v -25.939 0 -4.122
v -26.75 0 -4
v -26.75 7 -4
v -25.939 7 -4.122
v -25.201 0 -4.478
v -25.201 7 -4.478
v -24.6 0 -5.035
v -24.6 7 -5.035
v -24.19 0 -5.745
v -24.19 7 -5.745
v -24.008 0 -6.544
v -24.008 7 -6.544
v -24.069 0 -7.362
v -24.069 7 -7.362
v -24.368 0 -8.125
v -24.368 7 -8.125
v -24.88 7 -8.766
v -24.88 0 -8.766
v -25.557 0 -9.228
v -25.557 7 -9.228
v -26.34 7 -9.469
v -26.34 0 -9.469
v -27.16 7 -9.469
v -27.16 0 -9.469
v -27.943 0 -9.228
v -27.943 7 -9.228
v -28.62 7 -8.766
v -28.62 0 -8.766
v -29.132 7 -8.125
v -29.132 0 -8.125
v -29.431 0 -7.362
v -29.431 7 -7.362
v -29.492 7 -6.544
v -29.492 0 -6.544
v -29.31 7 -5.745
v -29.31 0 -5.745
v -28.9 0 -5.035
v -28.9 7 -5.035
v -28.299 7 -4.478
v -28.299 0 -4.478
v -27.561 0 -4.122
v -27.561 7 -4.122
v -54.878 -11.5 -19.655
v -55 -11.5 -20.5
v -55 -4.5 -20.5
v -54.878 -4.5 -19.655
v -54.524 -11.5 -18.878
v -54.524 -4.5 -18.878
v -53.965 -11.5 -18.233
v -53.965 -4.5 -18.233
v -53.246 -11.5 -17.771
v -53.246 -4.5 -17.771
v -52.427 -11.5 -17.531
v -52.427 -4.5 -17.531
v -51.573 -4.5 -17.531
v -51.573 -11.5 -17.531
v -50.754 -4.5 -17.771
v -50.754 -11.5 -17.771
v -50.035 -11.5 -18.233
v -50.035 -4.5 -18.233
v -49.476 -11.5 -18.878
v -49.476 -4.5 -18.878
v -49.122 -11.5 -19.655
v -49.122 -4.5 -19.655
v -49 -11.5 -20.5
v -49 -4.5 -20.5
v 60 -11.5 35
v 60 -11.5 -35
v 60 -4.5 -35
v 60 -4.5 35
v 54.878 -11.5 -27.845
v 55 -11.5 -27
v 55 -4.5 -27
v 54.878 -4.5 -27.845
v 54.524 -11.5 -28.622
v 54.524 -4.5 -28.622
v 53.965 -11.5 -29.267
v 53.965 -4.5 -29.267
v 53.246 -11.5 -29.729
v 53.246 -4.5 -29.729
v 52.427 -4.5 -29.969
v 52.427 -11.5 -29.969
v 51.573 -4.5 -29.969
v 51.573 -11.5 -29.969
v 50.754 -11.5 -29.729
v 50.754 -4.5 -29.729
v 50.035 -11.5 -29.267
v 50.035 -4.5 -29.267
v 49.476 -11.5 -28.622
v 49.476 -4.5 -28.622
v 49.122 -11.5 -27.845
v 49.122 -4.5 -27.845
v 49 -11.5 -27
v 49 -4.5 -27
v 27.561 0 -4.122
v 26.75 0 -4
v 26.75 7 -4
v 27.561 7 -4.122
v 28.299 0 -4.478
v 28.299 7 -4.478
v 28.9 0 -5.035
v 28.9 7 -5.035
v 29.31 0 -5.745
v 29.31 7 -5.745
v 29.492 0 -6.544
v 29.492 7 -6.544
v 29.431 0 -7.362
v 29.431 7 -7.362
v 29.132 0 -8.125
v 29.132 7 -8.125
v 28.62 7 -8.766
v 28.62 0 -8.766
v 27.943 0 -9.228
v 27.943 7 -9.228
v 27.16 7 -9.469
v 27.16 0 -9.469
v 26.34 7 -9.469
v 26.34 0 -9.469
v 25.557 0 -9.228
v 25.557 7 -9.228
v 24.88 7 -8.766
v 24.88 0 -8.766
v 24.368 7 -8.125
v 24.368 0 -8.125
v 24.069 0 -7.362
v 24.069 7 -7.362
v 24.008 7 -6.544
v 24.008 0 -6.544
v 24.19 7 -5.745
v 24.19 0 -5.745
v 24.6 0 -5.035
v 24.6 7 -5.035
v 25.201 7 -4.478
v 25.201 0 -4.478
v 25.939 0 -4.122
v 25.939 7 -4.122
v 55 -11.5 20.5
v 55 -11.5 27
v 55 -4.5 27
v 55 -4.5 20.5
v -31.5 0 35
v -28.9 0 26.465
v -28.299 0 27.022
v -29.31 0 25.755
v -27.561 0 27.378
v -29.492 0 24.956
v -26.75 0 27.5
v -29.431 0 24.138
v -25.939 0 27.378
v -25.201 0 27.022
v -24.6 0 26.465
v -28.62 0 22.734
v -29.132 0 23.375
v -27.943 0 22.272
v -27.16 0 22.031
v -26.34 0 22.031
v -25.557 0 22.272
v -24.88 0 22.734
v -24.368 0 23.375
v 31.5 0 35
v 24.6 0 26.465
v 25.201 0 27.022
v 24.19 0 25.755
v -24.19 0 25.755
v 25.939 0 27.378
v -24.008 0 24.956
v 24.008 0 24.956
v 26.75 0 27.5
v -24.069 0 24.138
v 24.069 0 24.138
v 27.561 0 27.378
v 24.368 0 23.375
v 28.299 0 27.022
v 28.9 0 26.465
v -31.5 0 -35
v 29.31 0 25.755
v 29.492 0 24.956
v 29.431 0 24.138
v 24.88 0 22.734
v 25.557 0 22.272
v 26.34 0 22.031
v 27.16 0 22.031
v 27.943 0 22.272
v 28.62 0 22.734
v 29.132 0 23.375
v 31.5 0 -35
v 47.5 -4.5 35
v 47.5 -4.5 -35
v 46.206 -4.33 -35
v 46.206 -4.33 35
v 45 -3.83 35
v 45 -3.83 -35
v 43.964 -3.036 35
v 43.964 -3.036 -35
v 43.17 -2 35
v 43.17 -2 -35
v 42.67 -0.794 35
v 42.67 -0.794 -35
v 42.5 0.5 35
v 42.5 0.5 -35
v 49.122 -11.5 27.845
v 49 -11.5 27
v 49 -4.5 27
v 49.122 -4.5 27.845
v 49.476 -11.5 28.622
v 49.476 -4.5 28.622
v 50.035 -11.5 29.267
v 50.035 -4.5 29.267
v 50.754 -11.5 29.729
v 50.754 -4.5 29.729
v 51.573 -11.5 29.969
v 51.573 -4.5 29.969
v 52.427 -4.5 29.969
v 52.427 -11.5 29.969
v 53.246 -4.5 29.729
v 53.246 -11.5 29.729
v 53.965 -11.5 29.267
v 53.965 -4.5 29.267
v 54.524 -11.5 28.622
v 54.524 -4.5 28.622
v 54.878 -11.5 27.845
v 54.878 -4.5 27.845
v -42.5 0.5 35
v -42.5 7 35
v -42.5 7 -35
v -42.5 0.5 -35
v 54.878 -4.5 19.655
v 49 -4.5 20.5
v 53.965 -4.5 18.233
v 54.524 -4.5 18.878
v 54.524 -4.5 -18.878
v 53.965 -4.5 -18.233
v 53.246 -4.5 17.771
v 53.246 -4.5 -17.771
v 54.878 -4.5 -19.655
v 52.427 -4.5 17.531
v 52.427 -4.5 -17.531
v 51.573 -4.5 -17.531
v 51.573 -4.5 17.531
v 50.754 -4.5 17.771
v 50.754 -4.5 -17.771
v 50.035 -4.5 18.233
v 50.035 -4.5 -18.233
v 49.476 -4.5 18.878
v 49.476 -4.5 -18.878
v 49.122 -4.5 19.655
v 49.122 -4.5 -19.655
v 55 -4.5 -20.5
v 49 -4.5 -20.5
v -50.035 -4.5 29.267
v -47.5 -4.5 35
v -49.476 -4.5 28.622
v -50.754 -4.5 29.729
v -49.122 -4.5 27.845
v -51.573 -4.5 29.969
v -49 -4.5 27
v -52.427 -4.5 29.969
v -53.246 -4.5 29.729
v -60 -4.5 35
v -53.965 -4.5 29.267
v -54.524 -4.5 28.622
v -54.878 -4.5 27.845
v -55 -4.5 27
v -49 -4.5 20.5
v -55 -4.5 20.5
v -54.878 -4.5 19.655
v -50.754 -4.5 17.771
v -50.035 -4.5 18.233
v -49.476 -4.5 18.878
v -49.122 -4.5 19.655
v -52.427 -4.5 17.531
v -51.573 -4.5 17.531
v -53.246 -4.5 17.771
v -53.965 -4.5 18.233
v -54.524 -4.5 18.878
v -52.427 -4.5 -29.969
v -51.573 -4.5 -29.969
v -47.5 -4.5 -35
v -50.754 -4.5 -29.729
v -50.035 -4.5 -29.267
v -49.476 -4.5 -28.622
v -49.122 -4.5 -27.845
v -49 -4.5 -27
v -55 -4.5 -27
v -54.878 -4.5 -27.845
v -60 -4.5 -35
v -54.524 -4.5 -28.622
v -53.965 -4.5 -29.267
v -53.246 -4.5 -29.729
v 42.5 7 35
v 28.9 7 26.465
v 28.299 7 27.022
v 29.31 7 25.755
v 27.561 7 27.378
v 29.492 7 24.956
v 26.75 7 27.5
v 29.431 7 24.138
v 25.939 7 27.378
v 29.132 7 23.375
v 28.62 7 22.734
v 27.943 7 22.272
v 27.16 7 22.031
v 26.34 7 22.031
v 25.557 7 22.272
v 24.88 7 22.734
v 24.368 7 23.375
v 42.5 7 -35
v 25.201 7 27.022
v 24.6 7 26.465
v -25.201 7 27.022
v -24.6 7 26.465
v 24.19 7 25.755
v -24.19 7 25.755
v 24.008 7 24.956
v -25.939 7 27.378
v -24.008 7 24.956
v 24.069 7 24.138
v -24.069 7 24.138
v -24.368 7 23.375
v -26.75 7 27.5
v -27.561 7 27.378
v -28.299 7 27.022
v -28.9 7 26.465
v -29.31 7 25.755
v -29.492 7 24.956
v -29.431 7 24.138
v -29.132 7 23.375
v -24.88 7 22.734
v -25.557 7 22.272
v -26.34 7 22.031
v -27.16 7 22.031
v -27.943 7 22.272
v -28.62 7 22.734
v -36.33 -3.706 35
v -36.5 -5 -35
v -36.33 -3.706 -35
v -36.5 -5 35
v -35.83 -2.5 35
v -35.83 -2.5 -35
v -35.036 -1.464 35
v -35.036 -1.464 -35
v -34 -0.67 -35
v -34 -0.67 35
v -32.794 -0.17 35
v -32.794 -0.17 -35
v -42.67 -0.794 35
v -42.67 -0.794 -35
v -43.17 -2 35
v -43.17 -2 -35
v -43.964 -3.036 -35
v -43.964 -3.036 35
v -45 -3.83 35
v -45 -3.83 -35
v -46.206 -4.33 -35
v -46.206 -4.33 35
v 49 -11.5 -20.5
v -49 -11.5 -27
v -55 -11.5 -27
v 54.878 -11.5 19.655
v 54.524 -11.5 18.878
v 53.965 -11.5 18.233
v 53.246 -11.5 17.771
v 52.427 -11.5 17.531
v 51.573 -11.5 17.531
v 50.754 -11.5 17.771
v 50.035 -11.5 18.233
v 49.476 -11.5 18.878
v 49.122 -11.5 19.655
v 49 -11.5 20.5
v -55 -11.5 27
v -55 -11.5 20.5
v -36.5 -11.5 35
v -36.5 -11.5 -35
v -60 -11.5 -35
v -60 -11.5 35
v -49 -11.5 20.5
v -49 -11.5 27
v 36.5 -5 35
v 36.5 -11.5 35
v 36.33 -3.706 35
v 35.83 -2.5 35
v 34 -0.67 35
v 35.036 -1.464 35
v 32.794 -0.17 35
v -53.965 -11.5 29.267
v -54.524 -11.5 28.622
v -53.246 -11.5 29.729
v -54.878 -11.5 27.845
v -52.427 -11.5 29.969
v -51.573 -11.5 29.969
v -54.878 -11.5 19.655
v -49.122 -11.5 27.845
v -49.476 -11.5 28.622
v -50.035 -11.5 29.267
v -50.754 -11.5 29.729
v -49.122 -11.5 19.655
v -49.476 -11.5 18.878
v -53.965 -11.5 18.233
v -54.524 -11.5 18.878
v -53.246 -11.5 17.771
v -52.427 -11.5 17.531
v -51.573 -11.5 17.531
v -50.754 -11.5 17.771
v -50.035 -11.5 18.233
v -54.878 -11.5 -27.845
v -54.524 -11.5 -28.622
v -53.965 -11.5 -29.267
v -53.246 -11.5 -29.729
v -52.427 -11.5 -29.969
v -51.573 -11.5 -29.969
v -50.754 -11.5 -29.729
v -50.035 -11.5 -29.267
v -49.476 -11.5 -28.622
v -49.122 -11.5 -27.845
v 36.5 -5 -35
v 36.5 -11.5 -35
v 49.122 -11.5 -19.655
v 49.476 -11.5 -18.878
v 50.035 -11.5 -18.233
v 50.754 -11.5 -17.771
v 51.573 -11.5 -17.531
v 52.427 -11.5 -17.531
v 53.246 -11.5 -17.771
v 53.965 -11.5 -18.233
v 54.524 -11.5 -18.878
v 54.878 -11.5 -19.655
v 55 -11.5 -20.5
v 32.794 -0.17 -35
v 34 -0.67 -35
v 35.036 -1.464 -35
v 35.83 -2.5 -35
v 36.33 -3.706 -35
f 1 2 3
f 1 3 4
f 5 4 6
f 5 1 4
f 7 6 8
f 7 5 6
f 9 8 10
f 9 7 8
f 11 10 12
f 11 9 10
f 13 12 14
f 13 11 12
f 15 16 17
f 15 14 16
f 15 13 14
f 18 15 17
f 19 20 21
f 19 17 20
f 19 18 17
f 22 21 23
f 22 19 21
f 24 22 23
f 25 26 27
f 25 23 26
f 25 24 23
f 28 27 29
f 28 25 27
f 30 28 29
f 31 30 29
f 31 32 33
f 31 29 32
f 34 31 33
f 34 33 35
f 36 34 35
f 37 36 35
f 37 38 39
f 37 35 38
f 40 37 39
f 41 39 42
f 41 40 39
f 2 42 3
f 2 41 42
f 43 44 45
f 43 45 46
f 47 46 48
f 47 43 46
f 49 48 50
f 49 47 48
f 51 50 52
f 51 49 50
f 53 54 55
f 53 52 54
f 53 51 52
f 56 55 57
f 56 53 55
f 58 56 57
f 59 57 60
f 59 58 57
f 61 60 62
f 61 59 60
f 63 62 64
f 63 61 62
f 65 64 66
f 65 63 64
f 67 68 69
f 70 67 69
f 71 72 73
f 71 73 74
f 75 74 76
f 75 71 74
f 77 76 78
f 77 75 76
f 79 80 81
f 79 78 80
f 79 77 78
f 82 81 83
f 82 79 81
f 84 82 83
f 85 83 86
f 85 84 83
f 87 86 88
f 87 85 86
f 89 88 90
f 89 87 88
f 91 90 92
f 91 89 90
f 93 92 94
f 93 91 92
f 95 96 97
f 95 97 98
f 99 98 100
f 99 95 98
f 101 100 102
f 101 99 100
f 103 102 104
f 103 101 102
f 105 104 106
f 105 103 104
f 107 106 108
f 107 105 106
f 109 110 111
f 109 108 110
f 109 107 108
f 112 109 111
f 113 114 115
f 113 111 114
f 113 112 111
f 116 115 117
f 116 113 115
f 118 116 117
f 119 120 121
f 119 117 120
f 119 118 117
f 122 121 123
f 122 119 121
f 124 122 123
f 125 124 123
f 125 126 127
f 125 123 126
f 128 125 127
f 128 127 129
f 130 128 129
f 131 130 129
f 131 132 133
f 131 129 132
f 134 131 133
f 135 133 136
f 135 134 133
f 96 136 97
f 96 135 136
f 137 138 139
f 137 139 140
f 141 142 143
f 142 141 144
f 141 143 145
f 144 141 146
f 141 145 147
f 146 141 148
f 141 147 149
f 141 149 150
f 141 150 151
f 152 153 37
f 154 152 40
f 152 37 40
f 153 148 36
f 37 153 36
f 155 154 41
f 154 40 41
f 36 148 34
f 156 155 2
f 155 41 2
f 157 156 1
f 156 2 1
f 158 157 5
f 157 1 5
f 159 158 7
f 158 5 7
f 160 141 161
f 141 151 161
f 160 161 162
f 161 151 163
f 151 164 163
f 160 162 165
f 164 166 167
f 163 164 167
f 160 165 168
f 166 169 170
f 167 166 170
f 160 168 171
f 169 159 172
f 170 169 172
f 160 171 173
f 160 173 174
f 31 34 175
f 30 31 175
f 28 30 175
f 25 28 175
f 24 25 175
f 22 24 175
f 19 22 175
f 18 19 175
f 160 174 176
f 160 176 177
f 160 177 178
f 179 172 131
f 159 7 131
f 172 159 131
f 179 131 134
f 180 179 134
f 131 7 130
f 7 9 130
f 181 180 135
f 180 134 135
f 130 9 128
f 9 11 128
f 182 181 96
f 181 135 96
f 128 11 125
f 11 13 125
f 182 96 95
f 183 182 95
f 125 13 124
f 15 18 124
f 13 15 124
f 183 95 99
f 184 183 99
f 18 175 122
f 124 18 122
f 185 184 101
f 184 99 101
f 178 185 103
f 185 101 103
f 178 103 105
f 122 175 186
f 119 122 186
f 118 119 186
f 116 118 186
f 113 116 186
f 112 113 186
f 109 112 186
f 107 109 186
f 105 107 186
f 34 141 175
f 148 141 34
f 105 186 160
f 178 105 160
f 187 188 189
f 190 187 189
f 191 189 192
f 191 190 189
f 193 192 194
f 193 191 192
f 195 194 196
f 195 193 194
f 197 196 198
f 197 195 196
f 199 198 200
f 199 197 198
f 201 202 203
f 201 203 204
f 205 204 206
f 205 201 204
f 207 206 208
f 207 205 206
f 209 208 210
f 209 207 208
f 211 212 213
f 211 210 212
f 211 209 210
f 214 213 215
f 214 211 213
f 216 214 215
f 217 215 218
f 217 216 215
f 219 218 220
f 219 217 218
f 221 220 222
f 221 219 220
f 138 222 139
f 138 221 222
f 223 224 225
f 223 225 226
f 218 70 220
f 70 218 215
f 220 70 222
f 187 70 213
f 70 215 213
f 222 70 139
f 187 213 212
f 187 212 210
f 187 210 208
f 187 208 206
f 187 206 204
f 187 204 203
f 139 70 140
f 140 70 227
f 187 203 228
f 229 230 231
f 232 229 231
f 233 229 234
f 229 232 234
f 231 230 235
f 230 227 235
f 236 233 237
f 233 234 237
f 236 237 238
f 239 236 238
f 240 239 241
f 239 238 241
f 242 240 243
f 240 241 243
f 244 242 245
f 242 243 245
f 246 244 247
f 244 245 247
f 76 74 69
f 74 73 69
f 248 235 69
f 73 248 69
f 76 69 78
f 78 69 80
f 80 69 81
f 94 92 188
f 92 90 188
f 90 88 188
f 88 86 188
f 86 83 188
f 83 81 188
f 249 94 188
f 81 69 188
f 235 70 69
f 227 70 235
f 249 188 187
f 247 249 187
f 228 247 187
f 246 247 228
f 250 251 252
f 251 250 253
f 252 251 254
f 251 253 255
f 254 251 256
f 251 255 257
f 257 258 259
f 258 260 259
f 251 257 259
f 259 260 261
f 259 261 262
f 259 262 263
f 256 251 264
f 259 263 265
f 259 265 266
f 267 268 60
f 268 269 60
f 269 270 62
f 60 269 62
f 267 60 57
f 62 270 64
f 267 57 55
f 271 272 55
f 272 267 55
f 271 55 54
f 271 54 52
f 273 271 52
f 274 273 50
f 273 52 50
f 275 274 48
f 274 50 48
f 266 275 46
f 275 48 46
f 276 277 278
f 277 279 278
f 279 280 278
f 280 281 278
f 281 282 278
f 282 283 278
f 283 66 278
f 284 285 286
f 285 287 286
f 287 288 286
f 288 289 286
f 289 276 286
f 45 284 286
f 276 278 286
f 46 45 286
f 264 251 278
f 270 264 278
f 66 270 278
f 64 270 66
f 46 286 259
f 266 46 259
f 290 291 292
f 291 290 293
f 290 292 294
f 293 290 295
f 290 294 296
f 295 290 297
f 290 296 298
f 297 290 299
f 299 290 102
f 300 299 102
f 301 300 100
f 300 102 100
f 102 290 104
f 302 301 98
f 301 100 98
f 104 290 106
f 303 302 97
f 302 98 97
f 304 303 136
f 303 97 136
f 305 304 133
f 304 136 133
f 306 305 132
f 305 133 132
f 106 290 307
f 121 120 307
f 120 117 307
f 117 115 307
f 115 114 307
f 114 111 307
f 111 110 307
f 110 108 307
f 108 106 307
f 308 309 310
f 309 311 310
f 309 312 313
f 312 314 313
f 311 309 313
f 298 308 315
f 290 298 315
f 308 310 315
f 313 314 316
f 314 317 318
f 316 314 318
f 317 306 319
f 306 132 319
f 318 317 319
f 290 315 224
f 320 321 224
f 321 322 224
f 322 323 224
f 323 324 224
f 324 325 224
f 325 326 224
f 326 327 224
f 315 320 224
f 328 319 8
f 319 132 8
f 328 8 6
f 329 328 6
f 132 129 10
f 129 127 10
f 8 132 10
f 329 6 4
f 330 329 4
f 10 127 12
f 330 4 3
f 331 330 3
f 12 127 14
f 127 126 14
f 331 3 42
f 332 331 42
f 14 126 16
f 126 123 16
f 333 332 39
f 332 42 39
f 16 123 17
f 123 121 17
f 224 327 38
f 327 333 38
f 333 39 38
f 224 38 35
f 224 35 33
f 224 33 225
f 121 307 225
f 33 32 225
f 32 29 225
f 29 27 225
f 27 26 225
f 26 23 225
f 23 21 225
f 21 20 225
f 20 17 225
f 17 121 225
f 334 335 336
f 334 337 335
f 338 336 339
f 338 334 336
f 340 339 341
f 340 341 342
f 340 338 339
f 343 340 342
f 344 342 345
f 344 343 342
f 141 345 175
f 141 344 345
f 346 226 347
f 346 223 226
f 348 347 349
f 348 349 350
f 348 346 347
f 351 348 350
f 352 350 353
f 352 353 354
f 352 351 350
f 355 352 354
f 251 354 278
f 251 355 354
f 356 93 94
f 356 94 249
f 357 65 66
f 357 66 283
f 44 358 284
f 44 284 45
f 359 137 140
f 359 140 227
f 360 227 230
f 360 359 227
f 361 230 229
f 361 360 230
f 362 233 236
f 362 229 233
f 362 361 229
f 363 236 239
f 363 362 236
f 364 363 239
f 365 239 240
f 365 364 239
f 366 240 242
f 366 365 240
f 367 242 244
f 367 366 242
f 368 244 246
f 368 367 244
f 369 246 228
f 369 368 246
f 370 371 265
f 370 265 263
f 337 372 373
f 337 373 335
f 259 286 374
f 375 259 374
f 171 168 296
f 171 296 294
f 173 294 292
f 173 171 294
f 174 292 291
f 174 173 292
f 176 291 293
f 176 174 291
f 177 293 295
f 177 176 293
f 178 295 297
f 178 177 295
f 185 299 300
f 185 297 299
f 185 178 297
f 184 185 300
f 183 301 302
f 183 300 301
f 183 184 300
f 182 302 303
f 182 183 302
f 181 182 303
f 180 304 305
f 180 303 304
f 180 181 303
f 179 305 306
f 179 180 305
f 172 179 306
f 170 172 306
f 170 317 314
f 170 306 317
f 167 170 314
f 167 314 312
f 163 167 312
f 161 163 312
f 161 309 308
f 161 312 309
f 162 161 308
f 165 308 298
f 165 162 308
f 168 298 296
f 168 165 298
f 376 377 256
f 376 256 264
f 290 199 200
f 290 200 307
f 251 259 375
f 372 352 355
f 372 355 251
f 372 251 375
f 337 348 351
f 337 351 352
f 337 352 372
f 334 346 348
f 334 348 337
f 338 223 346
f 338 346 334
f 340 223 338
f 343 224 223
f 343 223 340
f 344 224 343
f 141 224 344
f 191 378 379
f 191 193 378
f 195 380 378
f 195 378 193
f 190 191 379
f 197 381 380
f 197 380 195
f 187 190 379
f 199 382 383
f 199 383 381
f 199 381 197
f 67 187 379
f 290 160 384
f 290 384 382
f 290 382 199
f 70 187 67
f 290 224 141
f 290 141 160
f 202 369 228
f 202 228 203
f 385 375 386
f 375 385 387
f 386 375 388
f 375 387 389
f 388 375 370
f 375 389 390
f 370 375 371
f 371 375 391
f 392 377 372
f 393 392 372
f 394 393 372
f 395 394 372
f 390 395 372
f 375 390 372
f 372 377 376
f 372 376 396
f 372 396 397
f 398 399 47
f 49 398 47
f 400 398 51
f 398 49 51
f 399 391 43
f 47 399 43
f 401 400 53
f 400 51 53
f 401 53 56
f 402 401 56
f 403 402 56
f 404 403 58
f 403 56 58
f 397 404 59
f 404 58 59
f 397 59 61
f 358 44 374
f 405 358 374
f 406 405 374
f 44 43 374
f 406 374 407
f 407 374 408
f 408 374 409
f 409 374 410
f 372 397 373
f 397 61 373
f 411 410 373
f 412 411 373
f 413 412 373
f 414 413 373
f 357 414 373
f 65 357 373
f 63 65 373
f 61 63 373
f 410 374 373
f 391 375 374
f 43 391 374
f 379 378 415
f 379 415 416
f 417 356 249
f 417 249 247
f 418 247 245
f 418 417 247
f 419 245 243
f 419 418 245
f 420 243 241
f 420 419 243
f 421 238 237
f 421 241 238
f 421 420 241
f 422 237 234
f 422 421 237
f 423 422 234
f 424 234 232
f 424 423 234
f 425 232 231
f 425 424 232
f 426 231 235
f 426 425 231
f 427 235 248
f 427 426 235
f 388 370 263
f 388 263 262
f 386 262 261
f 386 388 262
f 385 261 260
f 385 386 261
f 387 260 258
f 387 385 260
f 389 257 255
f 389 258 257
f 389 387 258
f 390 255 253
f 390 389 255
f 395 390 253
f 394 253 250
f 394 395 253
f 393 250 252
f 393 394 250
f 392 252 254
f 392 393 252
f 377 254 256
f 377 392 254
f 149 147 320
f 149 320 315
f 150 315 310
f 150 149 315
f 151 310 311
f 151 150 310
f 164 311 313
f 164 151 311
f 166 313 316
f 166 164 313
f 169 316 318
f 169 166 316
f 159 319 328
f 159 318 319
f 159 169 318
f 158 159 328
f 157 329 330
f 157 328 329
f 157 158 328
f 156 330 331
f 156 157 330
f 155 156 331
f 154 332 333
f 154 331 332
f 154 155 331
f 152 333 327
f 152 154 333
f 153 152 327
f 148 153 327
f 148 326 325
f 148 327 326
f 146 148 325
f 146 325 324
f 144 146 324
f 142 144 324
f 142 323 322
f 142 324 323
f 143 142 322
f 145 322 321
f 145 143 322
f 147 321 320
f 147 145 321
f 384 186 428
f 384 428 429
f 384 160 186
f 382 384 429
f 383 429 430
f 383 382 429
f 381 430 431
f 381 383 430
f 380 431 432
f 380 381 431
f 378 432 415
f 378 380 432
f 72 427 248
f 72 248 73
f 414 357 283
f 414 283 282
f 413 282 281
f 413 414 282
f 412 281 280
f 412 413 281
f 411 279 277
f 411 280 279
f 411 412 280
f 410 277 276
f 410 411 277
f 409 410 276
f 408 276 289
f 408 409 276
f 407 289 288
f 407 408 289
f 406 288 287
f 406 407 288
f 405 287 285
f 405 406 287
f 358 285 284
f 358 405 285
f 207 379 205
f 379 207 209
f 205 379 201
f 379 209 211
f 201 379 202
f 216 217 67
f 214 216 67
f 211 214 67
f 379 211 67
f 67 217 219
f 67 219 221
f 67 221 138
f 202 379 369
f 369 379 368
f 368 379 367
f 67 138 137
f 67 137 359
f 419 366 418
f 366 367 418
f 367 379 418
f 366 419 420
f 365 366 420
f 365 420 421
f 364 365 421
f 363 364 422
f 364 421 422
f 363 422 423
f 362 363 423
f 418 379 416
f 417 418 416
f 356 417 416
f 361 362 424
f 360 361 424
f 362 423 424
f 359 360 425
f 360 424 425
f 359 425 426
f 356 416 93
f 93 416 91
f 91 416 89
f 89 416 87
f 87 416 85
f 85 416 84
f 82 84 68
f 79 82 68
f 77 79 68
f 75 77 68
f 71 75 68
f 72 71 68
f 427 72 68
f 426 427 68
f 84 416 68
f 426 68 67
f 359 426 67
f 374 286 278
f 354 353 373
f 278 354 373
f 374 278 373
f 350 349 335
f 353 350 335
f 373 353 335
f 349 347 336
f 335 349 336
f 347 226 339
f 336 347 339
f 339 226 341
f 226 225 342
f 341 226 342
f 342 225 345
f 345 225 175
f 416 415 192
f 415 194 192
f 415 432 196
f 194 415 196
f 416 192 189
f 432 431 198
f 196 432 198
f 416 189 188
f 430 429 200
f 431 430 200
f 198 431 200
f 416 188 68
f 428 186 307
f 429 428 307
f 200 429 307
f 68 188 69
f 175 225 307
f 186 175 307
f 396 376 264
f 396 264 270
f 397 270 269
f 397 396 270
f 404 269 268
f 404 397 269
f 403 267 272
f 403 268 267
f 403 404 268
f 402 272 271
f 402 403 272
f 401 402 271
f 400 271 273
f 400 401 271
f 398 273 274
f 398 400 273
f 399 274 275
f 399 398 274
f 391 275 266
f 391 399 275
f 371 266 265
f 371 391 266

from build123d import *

# Parameters (mm, degrees)
BOSS_EXTRUDE1_DEPTH      = 35
BOSS_EXTRUDE1_DEPTH_BACK = 35
FILLET1_R                = 5
CUT_EXTRUDE1_DEPTH       = 71.407741052
CUT_EXTRUDE1_DEPTH_BACK  = 71.407741052
SKETCH2_R                = 2.75


with BuildPart() as part:
    # Sketch1 → Boss-Extrude1 (new, two sides: drawn at the far end of the back side and taken through both)
    with BuildSketch(Plane.XY.offset(-BOSS_EXTRUDE1_DEPTH_BACK)):
        Polygon((-60, -11.5), (-36.5, -11.5), (-36.5, 0), (36.5, 0), (36.5, -11.5), (60, -11.5), (60, -4.5), (42.5, -4.5), (42.5, 7), (-42.5, 7), (-42.5, -4.5), (-60, -4.5), align=None)
    extrude(amount=BOSS_EXTRUDE1_DEPTH + BOSS_EXTRUDE1_DEPTH_BACK)

    # Fillet1
    fillet1_edges = [part.edges().sort_by_distance(p)[0] for p in [
        (36.5, 0, 0),
        (-36.5, 0, 0),
        (-42.5, -4.5, 0),
        (42.5, -4.5, 0),
    ]]
    fillet(fillet1_edges, radius=FILLET1_R)

    # Sketch2 → Cut-Extrude1 (cut, two sides: drawn at the far end of the back side and taken through both)
    with BuildSketch(Plane(origin=(0, 0, 0), x_dir=(1, 0, 0), z_dir=(0, 1, 0)).offset(-CUT_EXTRUDE1_DEPTH_BACK)):
        with BuildLine():
            Line((-49, -27), (-49, -20.5))
            ThreePointArc((-49, -20.5), (-52, -17.5), (-55, -20.5))
            Line((-55, -20.5), (-55, -27))
            ThreePointArc((-55, -27), (-52, -30), (-49, -27))
        make_face()
        with BuildLine():
            ThreePointArc((55, -20.5), (52, -17.5), (49, -20.5))
            Line((49, -20.5), (49, -27))
            ThreePointArc((49, -27), (52, -30), (55, -27))
            Line((55, -27), (55, -20.5))
        make_face()
        with BuildLine():
            ThreePointArc((55, 27), (52, 30), (49, 27))
            Line((49, 27), (49, 20.5))
            ThreePointArc((49, 20.5), (52, 17.5), (55, 20.5))
            Line((55, 20.5), (55, 27))
        make_face()
        with BuildLine():
            Line((-49, 20.5), (-49, 27))
            ThreePointArc((-49, 27), (-52, 30), (-55, 27))
            Line((-55, 27), (-55, 20.5))
            ThreePointArc((-55, 20.5), (-52, 17.5), (-49, 20.5))
        make_face()
        with Locations((-26.75, 6.75)):
            Circle(SKETCH2_R)
        with Locations((-26.75, -24.75)):
            Circle(SKETCH2_R)
        with Locations((26.75, 6.75)):
            Circle(SKETCH2_R)
        with Locations((26.75, -24.75)):
            Circle(SKETCH2_R)
    extrude(amount=CUT_EXTRUDE1_DEPTH + CUT_EXTRUDE1_DEPTH_BACK, mode=Mode.SUBTRACT)


solid = part.part
